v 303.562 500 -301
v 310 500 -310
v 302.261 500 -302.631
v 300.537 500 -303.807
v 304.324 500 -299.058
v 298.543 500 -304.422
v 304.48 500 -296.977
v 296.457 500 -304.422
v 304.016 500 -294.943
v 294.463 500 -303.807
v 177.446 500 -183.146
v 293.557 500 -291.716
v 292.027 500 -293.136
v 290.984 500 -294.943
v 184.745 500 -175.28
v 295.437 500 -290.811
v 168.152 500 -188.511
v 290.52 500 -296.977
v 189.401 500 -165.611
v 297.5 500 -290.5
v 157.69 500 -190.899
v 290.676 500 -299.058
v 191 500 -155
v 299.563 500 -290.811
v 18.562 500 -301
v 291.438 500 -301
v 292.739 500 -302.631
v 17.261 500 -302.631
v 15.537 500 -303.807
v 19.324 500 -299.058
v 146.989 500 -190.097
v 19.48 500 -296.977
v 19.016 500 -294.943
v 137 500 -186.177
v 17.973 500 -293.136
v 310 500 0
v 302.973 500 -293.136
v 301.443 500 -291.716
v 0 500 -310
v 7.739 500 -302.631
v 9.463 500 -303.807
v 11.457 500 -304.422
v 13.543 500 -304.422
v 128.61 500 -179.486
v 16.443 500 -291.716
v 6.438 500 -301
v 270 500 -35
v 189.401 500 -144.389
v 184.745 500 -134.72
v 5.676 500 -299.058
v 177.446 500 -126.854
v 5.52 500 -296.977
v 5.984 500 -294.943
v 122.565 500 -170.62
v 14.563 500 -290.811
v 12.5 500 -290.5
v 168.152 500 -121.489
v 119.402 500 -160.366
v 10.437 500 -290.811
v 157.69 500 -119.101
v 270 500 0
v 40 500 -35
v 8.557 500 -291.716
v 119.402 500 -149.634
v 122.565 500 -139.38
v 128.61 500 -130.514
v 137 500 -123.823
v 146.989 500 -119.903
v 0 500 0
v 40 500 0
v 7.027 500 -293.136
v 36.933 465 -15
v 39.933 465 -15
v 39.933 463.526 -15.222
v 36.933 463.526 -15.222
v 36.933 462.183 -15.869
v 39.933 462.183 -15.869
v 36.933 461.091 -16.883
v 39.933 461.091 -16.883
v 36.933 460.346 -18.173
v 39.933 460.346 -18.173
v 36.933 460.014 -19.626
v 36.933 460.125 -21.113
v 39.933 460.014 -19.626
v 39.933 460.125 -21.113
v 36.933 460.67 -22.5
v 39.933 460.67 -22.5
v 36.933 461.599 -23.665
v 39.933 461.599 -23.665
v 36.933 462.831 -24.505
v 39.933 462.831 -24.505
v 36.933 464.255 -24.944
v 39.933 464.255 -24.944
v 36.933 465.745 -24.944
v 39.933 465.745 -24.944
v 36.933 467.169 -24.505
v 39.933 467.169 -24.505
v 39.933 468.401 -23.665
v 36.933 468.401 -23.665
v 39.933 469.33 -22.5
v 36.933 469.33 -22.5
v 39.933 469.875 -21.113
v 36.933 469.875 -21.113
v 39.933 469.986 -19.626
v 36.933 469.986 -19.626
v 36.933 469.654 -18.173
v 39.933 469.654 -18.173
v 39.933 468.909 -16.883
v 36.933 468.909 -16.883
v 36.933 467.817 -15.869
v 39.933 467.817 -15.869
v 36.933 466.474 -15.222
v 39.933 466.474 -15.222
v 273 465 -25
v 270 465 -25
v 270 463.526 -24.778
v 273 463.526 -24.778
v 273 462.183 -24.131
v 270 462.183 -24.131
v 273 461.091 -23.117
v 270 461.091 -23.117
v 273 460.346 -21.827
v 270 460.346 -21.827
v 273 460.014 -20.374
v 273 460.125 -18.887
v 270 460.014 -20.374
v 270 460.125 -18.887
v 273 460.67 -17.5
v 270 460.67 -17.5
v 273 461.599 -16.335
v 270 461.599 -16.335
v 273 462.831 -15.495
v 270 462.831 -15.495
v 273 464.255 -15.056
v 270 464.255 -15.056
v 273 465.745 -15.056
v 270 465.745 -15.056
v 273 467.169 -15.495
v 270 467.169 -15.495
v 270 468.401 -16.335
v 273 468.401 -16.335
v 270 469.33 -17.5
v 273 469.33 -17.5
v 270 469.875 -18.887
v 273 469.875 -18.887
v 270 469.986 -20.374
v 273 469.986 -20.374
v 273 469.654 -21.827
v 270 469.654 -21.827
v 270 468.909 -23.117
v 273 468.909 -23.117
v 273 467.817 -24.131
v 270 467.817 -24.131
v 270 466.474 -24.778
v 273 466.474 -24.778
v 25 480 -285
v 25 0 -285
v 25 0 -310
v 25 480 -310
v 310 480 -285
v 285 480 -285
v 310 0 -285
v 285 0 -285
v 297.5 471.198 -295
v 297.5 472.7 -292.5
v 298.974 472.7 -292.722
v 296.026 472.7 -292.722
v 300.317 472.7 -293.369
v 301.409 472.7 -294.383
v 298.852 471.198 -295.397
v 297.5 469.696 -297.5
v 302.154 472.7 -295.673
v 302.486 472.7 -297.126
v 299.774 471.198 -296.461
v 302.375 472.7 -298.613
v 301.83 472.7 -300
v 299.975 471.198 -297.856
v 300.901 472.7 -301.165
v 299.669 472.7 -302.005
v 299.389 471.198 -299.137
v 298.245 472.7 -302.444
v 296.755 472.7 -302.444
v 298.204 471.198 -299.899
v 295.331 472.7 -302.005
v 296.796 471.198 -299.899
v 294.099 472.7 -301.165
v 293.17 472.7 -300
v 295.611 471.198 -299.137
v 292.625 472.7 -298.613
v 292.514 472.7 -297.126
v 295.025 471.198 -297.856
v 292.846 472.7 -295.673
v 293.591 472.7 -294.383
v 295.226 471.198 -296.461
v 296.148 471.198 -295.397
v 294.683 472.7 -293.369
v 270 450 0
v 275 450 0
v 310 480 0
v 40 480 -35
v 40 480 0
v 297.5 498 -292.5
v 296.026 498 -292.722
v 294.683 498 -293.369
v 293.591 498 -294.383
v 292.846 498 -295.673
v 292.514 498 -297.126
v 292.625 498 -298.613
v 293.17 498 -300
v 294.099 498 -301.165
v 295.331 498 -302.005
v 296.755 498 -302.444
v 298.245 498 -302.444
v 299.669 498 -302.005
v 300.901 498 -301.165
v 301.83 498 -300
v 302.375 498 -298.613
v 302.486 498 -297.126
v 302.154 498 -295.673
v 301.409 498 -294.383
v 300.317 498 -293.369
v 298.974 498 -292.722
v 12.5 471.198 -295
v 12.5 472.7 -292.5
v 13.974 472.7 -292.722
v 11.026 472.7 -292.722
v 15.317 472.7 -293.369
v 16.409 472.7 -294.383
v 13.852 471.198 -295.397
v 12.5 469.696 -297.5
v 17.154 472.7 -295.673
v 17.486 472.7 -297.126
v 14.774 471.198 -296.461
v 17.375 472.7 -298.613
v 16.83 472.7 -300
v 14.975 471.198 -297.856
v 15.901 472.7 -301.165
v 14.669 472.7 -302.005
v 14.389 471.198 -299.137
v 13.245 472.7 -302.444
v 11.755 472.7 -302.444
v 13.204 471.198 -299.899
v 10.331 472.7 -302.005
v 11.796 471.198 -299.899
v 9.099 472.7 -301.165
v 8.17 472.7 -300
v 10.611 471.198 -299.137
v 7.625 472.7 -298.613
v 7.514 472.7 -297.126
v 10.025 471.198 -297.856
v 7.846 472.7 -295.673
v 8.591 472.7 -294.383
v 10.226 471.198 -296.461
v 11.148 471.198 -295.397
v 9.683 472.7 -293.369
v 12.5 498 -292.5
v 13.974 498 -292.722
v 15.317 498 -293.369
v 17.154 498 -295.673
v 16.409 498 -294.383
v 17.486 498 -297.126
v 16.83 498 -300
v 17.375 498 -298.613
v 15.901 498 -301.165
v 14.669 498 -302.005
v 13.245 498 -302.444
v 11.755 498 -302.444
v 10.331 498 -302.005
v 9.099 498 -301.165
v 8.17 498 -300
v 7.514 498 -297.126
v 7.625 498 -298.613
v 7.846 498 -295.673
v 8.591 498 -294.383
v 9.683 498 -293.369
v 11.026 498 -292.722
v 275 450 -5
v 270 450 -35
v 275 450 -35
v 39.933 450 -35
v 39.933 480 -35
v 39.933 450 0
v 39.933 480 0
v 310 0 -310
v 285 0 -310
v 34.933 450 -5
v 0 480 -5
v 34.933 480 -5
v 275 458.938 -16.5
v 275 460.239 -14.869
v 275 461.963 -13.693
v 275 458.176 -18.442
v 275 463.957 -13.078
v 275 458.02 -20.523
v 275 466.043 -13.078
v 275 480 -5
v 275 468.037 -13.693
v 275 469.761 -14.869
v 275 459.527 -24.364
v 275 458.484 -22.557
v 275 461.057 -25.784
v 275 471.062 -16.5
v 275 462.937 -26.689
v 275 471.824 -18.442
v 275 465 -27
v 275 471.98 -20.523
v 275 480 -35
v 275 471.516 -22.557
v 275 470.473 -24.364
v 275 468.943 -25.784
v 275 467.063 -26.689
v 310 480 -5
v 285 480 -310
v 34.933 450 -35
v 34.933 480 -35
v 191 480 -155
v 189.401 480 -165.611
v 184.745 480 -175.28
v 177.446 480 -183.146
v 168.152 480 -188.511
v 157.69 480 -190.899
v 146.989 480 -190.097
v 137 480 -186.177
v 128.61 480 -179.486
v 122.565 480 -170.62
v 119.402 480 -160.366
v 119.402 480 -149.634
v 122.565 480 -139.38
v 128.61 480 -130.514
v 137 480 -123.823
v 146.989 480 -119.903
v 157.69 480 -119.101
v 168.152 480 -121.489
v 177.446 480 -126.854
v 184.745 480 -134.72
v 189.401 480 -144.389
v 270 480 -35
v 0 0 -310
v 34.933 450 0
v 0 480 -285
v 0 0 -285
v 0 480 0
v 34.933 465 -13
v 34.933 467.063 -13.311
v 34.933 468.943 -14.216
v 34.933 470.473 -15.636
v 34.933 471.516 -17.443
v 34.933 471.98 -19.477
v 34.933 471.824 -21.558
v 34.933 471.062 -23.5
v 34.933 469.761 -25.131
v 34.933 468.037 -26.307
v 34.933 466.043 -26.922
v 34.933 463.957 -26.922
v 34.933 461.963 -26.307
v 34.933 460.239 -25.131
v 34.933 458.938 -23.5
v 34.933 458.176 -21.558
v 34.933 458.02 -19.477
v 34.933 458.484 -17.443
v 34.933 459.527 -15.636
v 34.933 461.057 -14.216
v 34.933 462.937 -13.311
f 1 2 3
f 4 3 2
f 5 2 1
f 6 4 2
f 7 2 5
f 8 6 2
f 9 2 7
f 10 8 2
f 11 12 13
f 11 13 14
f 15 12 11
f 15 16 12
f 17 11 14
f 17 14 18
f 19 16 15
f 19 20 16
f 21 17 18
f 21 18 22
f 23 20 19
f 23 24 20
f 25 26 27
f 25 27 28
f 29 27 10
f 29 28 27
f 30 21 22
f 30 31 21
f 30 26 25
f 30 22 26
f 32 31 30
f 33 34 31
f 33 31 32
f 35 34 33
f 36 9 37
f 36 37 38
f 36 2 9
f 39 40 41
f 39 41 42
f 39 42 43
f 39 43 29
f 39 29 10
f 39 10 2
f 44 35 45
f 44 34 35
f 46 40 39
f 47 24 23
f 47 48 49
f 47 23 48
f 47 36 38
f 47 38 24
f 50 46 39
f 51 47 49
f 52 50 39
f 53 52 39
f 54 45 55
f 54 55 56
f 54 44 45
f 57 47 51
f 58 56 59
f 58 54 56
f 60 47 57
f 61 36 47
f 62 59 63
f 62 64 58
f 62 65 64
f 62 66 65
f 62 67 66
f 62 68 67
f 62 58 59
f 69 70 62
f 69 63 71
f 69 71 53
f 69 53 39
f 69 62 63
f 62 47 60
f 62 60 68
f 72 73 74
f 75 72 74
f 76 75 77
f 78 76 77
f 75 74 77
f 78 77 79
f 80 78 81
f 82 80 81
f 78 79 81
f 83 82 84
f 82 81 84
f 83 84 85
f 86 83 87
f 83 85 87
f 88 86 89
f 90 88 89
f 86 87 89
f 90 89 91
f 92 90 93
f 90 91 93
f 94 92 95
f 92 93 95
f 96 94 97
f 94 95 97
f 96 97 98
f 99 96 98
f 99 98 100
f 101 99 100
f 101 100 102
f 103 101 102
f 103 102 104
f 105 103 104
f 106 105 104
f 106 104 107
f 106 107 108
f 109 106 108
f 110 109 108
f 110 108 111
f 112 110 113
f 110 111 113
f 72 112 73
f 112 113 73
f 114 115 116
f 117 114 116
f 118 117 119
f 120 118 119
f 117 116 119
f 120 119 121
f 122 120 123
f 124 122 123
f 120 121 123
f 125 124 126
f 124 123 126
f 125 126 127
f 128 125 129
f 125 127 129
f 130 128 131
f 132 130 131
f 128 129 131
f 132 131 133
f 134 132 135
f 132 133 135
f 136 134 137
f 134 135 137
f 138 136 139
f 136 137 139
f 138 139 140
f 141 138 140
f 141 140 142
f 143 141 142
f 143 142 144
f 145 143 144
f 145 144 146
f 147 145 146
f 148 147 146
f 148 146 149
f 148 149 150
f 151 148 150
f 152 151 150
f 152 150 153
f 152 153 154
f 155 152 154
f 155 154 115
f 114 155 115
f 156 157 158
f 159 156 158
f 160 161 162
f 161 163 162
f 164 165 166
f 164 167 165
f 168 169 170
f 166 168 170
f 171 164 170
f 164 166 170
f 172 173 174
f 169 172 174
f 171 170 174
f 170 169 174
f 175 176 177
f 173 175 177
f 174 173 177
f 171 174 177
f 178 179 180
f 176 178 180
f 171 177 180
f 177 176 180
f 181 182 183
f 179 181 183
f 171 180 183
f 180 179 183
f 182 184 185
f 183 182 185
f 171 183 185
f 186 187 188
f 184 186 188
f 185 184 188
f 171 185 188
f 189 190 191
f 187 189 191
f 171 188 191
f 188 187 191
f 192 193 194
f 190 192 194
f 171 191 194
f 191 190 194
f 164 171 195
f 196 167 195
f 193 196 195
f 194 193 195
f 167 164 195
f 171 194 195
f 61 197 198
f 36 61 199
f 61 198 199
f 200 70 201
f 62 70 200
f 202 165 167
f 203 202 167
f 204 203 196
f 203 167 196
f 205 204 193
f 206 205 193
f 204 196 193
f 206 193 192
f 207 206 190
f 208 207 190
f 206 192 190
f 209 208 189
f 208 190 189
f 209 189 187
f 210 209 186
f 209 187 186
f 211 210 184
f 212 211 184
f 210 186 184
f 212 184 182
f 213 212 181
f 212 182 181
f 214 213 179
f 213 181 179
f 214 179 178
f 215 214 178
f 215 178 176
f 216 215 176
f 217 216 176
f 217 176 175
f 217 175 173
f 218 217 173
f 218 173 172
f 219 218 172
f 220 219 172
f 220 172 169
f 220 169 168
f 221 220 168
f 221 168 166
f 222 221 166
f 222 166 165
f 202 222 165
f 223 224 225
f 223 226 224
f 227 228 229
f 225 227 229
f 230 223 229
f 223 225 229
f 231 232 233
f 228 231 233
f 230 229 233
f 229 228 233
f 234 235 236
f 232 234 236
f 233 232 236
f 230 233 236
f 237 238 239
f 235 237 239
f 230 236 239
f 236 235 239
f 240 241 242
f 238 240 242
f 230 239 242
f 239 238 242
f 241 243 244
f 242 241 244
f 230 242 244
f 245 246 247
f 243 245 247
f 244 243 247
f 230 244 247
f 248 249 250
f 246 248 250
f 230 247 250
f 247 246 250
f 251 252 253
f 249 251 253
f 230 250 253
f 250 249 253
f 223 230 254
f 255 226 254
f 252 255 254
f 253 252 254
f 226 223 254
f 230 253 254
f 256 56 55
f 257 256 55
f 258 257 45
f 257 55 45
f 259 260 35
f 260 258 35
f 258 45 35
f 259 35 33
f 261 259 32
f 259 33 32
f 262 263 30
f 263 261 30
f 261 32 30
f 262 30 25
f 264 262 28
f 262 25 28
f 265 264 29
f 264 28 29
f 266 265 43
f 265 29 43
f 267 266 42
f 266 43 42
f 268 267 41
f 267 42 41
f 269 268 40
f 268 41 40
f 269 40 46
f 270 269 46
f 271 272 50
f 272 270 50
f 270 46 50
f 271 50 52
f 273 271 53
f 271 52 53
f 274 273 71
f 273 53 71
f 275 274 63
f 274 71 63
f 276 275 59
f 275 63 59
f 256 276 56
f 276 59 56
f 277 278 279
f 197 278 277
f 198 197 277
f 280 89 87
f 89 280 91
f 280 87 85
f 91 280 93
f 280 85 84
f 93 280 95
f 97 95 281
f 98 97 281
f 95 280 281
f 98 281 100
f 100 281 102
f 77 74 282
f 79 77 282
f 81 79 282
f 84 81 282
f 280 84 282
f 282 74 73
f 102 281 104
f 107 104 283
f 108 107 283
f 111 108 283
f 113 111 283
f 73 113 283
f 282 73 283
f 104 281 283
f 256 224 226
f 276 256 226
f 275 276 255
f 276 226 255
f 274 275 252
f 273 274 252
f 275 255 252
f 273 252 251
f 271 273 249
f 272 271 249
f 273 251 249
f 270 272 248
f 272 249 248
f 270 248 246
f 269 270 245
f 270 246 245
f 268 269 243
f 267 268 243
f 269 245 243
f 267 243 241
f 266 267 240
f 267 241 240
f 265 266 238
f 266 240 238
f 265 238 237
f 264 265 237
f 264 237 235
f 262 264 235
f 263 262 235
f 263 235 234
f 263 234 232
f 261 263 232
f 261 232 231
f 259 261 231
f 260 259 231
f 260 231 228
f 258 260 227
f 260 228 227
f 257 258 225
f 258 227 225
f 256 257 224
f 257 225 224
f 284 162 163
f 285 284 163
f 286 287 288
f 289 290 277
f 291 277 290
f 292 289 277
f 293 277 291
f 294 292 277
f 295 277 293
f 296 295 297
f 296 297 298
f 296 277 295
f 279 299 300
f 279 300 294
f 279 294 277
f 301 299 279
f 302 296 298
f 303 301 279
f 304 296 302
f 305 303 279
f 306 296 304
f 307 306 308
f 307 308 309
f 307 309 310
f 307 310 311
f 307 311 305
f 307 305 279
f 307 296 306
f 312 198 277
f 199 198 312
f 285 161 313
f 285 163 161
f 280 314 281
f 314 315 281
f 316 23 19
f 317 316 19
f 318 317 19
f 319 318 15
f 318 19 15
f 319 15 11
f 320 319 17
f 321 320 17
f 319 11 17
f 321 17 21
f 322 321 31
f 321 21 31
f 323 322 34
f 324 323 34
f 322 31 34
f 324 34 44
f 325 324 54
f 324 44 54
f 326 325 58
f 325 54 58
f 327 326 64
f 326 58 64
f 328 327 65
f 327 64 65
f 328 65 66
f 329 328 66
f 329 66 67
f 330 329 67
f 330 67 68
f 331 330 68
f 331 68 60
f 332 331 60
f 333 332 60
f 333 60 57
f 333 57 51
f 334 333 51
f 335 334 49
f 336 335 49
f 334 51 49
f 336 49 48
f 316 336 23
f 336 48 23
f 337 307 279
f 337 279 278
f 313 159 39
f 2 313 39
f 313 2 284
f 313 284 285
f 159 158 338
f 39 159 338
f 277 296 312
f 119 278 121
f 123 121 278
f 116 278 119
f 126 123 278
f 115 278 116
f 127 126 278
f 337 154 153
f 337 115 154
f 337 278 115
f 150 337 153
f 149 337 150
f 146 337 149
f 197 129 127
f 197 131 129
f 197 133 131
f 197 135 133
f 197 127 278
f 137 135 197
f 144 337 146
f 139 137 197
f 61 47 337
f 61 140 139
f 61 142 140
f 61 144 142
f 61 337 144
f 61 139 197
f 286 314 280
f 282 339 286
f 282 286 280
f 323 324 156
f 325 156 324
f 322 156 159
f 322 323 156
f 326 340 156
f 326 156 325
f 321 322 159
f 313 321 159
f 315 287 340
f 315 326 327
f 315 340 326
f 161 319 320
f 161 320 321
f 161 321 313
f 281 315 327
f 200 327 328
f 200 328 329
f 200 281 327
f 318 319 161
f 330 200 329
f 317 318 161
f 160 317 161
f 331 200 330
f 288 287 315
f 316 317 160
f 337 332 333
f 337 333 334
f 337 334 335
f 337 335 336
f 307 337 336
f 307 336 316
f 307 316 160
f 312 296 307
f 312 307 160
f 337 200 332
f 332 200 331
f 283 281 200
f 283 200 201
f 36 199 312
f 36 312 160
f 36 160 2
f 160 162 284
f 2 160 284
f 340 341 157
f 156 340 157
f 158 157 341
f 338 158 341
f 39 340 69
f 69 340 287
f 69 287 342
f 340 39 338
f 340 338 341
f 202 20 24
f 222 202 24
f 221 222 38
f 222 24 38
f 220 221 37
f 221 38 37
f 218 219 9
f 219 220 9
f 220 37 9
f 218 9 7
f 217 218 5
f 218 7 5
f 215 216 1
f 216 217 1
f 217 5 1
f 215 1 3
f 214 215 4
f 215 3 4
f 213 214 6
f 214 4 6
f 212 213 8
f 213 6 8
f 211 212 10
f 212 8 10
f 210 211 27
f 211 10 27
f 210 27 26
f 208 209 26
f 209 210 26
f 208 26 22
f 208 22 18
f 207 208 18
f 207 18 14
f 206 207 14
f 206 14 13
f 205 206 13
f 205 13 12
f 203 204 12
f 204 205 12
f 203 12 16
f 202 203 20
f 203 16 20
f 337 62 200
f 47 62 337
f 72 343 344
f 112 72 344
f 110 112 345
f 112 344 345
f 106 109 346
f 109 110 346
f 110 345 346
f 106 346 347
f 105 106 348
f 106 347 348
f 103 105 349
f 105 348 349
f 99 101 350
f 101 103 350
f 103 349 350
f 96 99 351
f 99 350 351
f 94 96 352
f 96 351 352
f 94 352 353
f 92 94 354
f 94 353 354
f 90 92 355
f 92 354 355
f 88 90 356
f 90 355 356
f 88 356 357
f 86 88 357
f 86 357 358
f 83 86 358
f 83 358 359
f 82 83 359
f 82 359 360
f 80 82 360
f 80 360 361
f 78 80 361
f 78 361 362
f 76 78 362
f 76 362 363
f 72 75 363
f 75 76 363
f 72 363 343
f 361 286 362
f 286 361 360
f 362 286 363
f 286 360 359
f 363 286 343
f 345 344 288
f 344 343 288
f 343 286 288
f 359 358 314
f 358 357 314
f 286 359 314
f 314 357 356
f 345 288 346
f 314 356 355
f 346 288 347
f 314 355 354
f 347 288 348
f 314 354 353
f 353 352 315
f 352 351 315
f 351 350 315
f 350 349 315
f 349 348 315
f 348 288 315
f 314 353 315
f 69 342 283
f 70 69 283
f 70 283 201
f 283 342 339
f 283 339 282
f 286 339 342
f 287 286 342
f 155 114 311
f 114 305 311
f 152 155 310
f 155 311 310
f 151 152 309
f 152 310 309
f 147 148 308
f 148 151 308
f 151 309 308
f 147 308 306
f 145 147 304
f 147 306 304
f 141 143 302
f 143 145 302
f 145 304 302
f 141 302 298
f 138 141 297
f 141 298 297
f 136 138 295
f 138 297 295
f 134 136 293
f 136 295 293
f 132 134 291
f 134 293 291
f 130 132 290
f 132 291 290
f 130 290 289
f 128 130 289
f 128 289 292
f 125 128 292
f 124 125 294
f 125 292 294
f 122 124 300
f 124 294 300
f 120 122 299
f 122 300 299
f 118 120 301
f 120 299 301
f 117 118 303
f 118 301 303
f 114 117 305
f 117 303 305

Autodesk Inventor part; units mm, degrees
ref_plane "YZ Plane" through (0, 0, 0) normal (1, 0, 0) x (0, 1, 0)
ref_plane "XZ Plane" through (0, 0, 0) normal (0, 1, 0) x (-1, 0, 0)
ref_plane "XY Plane" through (0, 0, 0) normal (0, 0, 1) x (1, 0, 0)
sketch "Skizze5" plane through (0, 0, 0) normal (0, 1, 0) x (-1, 0, 0)
  line L0 (0, 0) -> (-310, 0)
  line L1 (-310, 0) -> (-310, -310)
  line L2 (-310, -310) -> (0, -310)
  line L3 (0, -310) -> (0, 0)
  dimension "d14" = 310
  dimension "d15" = 310
extrude "Extrusion5" add sketch "Skizze5" along normal blind 500
sketch "Skizze6" plane through (0, 500, 0) normal (0, 1, 0) x (1, 0, 0)
  line L0 (0, 310) -> (0, 0) projected
  line L1 (0, 0) -> (310, 0) projected
  line L2 (40, 35) -> (270, 35)
  line L3 (270, 35) -> (270, 0)
  line L4 (270, 0) -> (40, 0)
  line L5 (40, 0) -> (40, 35)
  dimension "d20" = 230
extrude "Extrusion6" cut sketch "Skizze6" against normal blind 500
sketch "Skizze7" plane through (0, 0, 0) normal (0, -1, 0) x (1, 0, 0)
  line L0 (310, 0) -> (310, -310) projected
  line L1 (40, -35) -> (270, -35) projected
  line L2 (310, 0) -> (270, 0)
  line L3 (270, 0) -> (270, -35)
  line L4 (270, -35) -> (310, -35)
  line L5 (310, -35) -> (310, 0)
  line L6 (40, 0) -> (40, -35) projected
  line L7 (0, -310) -> (0, 0) projected
  line L8 (40, 0) -> (0, 0)
  line L9 (0, 0) -> (0, -35)
  line L10 (0, -35) -> (40, -35)
  line L11 (40, -35) -> (40, 0)
  line L12 (310, -35) -> (0, -35)
  line L13 (0, -35) -> (0, -285)
  line L14 (0, -285) -> (310, -285)
  line L15 (310, -285) -> (310, -35)
  line L16 (310, -310) -> (0, -310) projected
  line L17 (310, -285) -> (285, -285)
  line L18 (285, -285) -> (285, -310)
  line L19 (285, -310) -> (310, -310)
  line L20 (310, -310) -> (310, -285)
  line L21 (0, -285) -> (25, -285)
  line L22 (25, -285) -> (25, -310)
  line L23 (25, -310) -> (0, -310)
  line L24 (0, -310) -> (0, -285)
  dimension "d23" = 250
  dimension "d24" = 25
  dimension "d25" = 25
extrude "Extrusion7" cut sketch "Skizze7" against normal blind 480 contours L0 L4 L3 L2 | L0 L14 L7 L10 L1 L4 | L18 L16 L22 L14 | L10 L7 L8 L6
sketch "Skizze8" plane through (0, 500, 0) normal (0, 1, 0) x (1, 0, 0)
  line L0 (0, 0) -> (40, 0) projected
  circle A0 centre (155, 155) radius 36
  dimension "d30" = 72
extrude "Extrusion8" cut sketch "Skizze8" against normal blind 20
sketch "Skizze9" plane through (0, 480, 0) normal (0, -1, 0) x (1, 0, 0)
  point P0 (0, 0)
sketch "Skizze10" plane through (0, 480, 0) normal (0, -1, 0) x (1, 0, 0)
  line L0 (270, 0) -> (310, 0) projected
  line L1 (270, 0) -> (275, 0)
  line L2 (275, 0) -> (275, -35)
  line L3 (275, -35) -> (270, -35)
  line L4 (270, -35) -> (270, 0)
  line L5 (39.9329, 0) -> (34.9329, 0)
  line L6 (34.9329, 0) -> (34.9329, -35)
  line L7 (34.9329, -35) -> (39.9329, -35)
  line L8 (39.9329, -35) -> (39.9329, 0)
  point P0 (0, 0)
  dimension "d33" = 5
  dimension "d34" = 35
  dimension "d35" = 5
extrude "Extrusion9" add sketch "Skizze10" along normal blind 30
sketch "Skizze11" plane through (0, 500, 0) normal (0, 0, 1) x (1, 0, 0)
  line L0 (0, -20) -> (0, 0) projected
  line L1 (0, -20) -> (34.9329, -20) projected
  line L2 (0, -20) -> (34.9329, -20)
  line L3 (39.9329, -50) -> (34.9329, -50) projected
  line L4 (34.9329, -20) -> (34.9329, -50)
  line L5 (34.9329, -50) -> (0, -20)
  line L6 (275, -20) -> (310, -20) projected
  line L7 (310, -20) -> (275, -20)
  line L8 (275, -20) -> (275, -50) projected
  line L9 (275, -20) -> (275, -50)
  line L10 (275, -50) -> (310, -20)
  point P0 (0, -500)
extrude "Extrusion10" add sketch "Skizze11" against normal blind 5
sketch "Skizze12" plane through (34.9329, 450, -35) normal (-1, 0, 0) x (0, 0, 1)
  line L0 (30, 0) -> (0, 0) projected
  line L1 (0, 0) -> (15, 0)
  line L2 (15, 0) -> (15, 15)
  line L3 (15, 15) -> (0, 15)
  line L4 (0, 15) -> (0, 0)
  point P0 (35, -450)
  dimension "d40" = 15
  dimension "d41" = 15
hole "Bohrung1" at (34.9329, 465, -20) direction (1, 0, 0) diameter 10 depth 27.3 tip angle 118
sketch "Skizze13" plane through (275, 450, -35) normal (1, 0, 0) x (0, 0, -1)
  line L0 (0, 0) -> (-15, 0)
  line L1 (-15, 0) -> (-15, 15)
  line L2 (-15, 15) -> (0, 15)
  line L3 (0, 15) -> (0, 0)
  point P0 (-35, -450)
  dimension "d49" = 15
  dimension "d50" = 15
hole "Bohrung2" at (275, 465, -20) direction (-1, 0, 0) diameter 10 depth 27.3 tip angle 118
chamfer "Fase1" distance 2 angle 45 1 edges at (34.9329, 465, -25)
chamfer "Fase2" distance 2 angle 45 1 edges at (275, 465, -15)
sketch "Skizze14" plane through (0, 500, 0) normal (0, 1, 0) x (1, 0, 0)
  line L0 (310, 0) -> (310, 310) projected
  line L1 (310, 310) -> (297.5, 310)
  line L2 (297.5, 310) -> (297.5, 297.5)
  line L3 (297.5, 297.5) -> (310, 297.5)
  line L4 (310, 297.5) -> (310, 310)
  line L5 (0, 310) -> (0, 285) projected
  line L6 (0, 310) -> (12.5, 310)
  line L7 (12.5, 310) -> (12.5, 297.5)
  line L8 (12.5, 297.5) -> (0, 297.5)
  line L9 (0, 297.5) -> (0, 310)
  point P0 (0, 0)
  dimension "d64" = 12.5
  dimension "d65" = 12.5
  dimension "d66" = 12.5
  dimension "d67" = 12.5
hole "Bohrung3" at (12.5, 500, -297.5) at (297.5, 500, -297.5) direction (0, -1, 0) diameter 10 depth 27.3 tip angle 118
chamfer "Fase3" distance 2 angle 45 2 edges at (297.5, 500, -302.5) (12.5, 500, -302.5)
properties part number "Haltung_Presse"
